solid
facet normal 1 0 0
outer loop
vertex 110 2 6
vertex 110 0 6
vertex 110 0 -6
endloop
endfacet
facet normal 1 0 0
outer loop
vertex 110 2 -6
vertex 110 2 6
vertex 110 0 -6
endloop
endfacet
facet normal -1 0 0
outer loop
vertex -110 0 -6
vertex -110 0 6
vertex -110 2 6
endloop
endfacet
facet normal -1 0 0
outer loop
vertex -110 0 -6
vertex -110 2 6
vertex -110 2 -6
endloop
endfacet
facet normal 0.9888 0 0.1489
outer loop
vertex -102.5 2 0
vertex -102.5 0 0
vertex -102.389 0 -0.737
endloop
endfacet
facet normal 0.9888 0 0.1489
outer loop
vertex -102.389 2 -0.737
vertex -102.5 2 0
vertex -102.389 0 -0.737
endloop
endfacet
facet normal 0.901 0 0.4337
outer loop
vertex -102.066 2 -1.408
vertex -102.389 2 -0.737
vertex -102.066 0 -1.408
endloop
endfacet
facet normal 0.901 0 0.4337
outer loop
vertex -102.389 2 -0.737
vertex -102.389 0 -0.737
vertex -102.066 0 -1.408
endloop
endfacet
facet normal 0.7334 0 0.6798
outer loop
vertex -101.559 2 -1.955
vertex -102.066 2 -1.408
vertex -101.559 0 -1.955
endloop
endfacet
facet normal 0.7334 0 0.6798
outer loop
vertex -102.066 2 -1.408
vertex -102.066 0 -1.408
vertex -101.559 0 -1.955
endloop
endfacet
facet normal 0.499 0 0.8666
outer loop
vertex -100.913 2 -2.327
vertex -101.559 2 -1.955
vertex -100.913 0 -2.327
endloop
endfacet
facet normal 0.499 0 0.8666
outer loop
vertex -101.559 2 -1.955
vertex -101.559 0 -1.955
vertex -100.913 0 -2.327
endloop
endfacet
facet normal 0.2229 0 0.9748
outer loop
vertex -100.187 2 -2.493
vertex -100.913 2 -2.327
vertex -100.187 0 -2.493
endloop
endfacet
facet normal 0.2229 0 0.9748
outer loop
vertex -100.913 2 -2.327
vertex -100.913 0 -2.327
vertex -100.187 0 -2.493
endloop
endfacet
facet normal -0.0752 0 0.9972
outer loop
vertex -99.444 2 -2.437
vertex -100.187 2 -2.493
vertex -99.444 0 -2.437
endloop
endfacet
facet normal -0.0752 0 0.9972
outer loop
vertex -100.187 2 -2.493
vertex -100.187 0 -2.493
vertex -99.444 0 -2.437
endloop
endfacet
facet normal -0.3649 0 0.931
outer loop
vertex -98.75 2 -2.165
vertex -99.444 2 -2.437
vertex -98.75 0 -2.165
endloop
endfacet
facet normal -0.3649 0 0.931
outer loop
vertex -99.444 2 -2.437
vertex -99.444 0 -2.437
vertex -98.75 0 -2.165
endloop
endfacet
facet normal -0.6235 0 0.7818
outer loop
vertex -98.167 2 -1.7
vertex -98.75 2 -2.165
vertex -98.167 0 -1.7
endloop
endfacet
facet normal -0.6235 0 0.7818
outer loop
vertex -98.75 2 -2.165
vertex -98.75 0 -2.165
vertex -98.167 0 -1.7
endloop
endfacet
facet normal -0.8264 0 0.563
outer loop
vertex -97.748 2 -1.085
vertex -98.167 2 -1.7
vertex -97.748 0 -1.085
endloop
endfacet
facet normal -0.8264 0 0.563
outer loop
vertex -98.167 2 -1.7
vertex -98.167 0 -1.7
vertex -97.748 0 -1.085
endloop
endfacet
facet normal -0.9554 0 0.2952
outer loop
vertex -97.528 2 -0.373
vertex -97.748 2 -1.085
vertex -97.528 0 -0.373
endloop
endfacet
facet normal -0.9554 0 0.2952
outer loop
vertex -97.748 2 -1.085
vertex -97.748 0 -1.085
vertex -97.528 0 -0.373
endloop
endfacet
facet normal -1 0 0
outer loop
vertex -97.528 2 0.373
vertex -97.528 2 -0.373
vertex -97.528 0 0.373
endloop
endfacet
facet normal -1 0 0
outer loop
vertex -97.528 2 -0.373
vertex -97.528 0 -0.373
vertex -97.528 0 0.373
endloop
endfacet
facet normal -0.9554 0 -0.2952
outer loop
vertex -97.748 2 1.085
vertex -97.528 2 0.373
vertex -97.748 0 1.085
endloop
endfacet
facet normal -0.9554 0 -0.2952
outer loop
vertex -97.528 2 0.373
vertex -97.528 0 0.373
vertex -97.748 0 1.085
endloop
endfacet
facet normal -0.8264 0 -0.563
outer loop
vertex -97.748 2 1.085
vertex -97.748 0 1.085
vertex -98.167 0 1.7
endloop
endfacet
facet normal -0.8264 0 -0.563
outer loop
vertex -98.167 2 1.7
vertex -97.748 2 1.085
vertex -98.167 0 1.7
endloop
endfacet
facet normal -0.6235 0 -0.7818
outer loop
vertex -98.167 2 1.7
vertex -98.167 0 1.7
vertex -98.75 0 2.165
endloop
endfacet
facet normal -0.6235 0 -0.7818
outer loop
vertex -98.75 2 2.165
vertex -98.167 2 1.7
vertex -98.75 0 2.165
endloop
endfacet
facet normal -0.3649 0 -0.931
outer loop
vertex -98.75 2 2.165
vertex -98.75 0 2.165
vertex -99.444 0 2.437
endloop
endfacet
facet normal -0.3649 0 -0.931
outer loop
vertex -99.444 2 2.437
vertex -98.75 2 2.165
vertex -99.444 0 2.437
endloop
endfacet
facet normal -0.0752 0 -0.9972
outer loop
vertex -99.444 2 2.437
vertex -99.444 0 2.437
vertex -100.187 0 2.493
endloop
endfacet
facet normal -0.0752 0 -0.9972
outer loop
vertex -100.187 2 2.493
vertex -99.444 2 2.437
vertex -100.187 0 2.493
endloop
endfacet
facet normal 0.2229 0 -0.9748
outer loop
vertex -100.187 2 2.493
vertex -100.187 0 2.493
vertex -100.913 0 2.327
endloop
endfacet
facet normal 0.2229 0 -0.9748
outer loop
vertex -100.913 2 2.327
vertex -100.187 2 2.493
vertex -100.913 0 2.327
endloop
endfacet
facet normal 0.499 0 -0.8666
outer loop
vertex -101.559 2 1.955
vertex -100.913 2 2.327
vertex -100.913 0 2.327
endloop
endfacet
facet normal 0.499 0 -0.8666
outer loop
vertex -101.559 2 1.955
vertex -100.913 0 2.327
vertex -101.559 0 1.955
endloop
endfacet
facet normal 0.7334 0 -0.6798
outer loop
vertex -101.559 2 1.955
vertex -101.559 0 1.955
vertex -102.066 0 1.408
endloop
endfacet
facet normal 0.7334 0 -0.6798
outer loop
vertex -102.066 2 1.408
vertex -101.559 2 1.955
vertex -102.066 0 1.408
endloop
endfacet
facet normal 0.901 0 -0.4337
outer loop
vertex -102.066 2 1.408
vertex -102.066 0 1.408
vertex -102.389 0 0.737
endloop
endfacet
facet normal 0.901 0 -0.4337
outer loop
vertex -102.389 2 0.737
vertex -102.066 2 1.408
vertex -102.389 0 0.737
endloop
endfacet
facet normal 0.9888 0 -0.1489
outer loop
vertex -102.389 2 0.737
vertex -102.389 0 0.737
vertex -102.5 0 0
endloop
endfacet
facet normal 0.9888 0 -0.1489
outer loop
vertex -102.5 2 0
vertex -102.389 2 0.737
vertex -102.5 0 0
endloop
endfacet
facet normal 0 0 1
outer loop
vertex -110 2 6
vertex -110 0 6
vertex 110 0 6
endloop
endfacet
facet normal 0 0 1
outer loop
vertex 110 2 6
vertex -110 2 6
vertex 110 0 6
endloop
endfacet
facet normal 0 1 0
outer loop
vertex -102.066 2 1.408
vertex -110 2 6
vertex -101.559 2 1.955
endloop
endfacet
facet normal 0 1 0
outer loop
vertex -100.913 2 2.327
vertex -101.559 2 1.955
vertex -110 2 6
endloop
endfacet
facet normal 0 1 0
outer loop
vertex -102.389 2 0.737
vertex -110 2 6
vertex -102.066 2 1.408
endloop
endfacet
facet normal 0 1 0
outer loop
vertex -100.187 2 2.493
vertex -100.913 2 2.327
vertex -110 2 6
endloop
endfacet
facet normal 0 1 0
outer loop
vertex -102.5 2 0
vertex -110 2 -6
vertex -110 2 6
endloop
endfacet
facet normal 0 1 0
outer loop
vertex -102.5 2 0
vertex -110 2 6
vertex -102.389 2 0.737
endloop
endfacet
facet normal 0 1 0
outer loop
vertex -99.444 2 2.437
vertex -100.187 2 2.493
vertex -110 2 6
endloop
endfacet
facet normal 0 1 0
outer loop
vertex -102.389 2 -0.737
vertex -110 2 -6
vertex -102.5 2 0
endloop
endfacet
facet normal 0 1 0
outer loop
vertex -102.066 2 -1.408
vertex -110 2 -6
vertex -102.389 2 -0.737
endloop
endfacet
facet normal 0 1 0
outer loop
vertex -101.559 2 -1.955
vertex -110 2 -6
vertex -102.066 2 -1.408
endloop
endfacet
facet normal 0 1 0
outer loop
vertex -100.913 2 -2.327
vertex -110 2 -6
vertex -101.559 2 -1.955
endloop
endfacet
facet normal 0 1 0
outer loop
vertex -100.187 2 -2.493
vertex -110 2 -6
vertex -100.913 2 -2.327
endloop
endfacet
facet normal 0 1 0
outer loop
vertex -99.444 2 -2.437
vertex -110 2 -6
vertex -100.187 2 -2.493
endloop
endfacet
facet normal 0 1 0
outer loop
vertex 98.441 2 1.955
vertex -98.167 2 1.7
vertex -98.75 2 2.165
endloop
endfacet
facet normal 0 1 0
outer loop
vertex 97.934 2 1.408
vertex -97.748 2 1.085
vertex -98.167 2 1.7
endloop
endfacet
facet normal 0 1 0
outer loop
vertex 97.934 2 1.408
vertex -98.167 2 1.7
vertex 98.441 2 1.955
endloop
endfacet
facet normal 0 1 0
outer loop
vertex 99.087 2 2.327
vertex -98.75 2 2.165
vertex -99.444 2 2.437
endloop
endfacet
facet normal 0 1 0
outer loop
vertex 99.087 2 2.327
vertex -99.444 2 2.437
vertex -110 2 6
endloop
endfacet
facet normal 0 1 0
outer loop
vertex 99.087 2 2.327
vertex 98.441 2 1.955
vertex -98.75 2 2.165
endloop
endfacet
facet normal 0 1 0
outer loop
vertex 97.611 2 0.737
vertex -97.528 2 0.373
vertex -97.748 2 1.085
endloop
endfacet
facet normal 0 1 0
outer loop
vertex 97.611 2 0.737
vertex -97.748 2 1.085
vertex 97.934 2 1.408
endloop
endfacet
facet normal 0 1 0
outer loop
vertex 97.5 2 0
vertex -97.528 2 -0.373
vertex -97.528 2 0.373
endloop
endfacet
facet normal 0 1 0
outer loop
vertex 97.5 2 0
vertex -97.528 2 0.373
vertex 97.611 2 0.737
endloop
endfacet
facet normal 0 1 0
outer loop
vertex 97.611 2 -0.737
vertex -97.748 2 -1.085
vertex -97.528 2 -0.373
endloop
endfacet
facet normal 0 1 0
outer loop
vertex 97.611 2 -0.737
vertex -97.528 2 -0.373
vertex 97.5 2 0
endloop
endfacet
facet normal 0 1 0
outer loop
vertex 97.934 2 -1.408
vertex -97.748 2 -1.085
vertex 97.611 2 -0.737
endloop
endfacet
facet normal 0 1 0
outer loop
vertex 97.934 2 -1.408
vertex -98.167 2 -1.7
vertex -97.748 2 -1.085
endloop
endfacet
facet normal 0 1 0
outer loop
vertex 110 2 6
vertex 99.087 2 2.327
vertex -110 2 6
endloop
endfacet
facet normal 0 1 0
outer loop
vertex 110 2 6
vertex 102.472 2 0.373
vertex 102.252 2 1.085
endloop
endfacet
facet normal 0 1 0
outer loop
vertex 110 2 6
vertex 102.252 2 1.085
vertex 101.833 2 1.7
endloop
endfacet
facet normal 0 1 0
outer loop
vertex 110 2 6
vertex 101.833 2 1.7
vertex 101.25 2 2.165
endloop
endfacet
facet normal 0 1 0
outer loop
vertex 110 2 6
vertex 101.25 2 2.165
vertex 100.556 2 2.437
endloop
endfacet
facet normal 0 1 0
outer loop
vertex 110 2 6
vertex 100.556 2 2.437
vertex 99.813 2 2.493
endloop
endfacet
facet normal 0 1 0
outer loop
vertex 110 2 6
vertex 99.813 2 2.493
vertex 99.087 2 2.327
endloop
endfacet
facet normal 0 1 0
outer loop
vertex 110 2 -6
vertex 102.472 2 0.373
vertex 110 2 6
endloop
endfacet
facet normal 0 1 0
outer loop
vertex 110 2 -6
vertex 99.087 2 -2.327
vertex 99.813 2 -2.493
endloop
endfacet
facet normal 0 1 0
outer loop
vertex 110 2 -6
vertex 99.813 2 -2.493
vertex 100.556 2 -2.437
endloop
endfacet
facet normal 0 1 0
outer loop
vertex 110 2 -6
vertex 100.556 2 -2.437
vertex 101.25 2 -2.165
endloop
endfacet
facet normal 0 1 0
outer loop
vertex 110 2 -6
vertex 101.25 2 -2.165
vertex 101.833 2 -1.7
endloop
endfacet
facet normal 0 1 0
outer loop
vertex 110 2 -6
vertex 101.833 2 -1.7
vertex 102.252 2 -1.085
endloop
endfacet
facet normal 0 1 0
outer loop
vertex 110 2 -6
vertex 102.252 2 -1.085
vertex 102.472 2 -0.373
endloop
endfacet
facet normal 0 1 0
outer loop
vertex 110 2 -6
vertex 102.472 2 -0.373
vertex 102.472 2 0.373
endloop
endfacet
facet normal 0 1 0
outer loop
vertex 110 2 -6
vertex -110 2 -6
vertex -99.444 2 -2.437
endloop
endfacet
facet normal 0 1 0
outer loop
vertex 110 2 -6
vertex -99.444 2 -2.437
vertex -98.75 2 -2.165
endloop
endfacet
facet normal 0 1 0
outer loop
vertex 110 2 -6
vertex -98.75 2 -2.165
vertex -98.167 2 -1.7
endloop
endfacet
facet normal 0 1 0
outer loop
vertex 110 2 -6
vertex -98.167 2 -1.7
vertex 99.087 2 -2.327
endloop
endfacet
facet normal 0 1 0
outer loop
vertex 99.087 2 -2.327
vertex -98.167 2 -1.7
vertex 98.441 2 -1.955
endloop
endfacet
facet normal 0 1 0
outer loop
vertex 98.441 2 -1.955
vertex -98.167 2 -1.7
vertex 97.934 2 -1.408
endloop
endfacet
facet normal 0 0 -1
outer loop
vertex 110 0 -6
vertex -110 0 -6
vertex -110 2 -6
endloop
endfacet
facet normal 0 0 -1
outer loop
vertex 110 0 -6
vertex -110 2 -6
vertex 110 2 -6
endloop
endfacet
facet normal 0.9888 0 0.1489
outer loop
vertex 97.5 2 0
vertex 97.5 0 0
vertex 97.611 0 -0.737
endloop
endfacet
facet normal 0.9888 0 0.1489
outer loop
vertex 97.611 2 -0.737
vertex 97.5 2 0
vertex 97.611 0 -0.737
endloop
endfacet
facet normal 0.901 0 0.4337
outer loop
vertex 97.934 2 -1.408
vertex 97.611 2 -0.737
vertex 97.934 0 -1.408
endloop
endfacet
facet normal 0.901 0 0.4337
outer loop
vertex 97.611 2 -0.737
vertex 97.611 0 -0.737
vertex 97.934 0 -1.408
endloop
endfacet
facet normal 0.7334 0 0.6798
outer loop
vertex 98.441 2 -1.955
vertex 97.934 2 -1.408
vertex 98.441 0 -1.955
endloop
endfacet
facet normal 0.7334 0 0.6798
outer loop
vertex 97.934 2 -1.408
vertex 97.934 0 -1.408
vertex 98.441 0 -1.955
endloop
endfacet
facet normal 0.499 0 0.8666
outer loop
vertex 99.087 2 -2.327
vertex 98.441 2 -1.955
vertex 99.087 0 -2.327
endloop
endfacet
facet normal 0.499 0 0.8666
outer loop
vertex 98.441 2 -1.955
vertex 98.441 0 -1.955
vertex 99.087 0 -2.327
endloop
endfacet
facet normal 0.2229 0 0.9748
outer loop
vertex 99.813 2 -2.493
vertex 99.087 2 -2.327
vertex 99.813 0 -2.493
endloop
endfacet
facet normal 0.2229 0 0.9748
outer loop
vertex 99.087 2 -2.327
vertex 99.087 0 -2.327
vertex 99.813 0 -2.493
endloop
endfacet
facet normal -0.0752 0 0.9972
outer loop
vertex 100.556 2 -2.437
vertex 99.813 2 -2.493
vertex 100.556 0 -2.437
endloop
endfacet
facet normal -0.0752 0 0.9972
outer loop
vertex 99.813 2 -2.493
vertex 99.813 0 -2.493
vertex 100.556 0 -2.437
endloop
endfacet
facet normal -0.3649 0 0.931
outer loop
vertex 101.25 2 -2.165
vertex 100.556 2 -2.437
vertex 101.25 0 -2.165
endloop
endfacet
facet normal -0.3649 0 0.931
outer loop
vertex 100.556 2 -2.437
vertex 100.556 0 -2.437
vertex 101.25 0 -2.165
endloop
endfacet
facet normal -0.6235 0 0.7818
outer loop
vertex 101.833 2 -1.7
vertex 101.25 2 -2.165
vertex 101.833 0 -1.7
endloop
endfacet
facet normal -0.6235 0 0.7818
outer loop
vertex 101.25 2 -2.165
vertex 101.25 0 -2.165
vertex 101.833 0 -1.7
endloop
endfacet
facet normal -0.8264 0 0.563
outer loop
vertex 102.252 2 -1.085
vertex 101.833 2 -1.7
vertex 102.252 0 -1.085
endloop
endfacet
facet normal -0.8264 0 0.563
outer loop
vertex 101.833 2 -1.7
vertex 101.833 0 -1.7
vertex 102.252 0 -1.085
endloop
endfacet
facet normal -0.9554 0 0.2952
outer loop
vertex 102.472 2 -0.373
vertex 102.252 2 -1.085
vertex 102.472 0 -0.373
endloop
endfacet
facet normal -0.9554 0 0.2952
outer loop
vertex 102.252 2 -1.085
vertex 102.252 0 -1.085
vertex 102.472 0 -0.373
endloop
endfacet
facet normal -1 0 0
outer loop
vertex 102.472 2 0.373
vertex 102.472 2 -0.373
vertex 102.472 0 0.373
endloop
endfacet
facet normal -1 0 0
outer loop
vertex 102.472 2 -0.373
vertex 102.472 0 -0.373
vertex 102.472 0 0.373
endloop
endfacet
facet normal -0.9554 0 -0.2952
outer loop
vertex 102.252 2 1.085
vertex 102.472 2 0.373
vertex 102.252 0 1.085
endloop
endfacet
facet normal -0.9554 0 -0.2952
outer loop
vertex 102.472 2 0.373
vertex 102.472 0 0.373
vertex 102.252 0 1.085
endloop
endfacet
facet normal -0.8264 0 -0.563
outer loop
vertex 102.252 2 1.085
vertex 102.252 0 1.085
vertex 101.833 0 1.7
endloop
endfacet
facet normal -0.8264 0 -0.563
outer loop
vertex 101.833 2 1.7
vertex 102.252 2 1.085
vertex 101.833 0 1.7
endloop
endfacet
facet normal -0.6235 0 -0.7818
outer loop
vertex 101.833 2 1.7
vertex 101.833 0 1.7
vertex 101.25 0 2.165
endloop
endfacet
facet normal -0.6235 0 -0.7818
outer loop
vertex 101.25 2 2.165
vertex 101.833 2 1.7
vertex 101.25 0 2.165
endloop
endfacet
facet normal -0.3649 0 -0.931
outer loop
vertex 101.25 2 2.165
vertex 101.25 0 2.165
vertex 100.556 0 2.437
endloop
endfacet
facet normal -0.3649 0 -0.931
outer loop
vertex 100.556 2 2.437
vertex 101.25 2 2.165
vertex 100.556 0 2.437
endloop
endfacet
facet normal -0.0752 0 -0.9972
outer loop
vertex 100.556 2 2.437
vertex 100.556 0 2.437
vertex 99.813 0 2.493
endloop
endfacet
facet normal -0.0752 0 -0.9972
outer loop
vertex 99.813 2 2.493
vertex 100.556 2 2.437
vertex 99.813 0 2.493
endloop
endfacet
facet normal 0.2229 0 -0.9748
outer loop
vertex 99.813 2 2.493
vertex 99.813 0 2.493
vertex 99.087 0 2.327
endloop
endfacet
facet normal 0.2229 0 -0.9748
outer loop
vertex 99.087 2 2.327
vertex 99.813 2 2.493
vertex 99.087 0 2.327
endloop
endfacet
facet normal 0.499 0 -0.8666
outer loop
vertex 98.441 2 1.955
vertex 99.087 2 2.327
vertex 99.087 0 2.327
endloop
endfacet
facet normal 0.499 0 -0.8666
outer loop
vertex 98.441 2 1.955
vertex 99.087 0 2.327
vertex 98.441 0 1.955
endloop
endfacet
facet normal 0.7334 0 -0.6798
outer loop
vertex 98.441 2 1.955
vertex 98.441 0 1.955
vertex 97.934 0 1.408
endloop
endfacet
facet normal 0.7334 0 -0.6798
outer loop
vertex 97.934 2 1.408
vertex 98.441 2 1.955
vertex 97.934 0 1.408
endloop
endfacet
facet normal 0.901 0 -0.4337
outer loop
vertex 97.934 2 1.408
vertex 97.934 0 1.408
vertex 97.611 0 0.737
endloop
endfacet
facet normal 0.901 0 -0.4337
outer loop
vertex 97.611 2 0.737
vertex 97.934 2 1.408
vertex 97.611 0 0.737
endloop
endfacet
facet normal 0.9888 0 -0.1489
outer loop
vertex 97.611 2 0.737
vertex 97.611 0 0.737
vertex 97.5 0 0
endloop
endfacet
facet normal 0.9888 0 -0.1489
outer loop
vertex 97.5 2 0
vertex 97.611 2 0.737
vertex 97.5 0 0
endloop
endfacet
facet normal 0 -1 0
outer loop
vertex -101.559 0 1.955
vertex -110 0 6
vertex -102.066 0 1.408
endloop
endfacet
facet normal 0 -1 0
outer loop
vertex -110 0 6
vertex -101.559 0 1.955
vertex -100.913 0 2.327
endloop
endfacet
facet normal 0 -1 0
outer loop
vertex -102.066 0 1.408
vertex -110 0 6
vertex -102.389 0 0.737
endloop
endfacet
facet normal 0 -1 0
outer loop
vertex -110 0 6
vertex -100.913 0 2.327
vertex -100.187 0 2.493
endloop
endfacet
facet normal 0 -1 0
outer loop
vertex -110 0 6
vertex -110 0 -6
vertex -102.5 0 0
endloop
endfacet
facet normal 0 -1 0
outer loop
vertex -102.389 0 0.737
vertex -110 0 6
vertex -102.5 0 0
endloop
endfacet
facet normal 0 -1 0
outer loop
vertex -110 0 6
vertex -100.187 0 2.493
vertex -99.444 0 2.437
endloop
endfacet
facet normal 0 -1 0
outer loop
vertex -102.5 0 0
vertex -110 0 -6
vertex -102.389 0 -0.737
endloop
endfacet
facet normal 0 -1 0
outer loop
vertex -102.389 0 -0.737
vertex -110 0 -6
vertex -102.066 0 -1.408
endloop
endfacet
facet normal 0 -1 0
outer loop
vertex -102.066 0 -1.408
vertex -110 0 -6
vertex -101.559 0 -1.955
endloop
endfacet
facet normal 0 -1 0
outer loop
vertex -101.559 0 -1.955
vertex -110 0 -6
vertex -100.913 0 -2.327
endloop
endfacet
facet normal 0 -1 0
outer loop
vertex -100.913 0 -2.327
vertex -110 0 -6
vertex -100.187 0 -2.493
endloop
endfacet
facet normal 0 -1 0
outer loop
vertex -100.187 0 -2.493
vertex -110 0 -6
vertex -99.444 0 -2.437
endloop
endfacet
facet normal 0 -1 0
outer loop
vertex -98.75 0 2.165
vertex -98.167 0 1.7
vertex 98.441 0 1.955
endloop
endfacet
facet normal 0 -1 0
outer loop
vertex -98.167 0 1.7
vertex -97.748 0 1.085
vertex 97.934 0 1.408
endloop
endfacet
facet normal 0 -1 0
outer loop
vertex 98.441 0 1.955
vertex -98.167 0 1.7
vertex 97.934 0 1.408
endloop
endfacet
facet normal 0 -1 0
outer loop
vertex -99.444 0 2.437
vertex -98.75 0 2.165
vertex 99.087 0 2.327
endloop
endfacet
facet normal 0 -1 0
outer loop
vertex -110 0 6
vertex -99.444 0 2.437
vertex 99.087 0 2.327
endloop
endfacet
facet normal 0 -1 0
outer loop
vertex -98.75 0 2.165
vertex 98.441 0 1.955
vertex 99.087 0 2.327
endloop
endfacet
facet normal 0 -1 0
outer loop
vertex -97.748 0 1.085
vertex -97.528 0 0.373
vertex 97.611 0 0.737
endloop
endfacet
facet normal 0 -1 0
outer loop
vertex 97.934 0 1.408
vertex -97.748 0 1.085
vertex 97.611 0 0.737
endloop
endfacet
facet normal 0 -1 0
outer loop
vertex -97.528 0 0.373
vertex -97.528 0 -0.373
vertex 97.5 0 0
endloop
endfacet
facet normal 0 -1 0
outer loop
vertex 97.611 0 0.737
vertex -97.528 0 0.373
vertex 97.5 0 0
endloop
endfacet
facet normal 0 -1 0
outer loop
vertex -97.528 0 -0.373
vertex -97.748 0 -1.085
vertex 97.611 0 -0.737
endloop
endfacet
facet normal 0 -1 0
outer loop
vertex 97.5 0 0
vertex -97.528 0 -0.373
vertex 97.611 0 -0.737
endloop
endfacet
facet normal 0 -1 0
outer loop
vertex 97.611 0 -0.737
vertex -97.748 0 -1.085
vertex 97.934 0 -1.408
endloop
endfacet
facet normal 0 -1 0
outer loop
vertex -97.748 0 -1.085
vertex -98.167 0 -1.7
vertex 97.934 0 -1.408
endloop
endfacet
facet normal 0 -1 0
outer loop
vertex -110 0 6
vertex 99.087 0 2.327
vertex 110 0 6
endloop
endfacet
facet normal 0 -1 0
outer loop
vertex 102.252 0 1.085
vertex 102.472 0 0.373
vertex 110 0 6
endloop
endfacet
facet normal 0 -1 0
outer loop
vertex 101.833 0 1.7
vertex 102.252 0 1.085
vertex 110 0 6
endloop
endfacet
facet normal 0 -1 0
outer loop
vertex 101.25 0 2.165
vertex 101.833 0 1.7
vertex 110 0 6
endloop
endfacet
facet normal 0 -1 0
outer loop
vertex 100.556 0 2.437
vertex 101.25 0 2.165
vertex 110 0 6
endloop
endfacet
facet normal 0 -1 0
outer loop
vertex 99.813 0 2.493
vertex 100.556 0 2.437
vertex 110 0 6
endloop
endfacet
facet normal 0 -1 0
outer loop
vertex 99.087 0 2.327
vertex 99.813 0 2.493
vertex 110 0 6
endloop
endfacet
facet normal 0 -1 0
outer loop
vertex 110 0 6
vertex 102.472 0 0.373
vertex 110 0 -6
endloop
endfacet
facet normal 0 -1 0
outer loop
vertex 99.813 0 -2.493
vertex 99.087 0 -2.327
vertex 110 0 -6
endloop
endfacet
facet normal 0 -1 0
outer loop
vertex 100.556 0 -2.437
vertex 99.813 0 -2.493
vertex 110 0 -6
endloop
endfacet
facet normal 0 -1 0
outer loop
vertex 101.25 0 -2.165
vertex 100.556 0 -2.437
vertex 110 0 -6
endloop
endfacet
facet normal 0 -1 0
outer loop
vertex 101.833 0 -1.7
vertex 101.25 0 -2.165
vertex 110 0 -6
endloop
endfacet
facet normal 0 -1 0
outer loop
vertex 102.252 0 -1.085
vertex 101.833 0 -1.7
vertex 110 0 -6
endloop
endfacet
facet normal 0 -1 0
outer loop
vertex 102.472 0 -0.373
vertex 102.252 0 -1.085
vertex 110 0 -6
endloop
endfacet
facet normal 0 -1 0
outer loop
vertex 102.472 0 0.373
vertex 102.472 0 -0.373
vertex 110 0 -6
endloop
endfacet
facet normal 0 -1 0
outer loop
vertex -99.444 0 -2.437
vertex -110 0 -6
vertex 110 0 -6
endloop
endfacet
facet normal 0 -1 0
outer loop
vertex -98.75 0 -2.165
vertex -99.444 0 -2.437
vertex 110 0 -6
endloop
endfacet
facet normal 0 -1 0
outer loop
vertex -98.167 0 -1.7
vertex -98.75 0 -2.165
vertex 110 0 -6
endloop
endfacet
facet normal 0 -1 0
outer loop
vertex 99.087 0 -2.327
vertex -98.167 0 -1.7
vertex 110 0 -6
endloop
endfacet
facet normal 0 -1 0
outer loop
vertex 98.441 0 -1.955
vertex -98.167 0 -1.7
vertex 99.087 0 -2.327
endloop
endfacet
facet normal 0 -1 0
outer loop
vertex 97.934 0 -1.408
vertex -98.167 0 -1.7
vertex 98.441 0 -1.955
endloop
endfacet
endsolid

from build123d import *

# Parameters (mm, degrees)
SKETCH1_W                 = 220
SKETCH1_H                 = 12
BOSS_EXTRUDE1_DEPTH       = 2
F_5_0MM_DOWEL_HOLE1_D     = 5
F_5_0MM_DOWEL_HOLE1_DEPTH = 2


with BuildPart() as part:
    # Sketch1 → Boss-Extrude1 (new body)
    with BuildSketch(Plane(origin=(0, 0, 0), x_dir=(1, 0, 0), z_dir=(0, 1, 0))):
        Rectangle(SKETCH1_W, SKETCH1_H)
    extrude(amount=BOSS_EXTRUDE1_DEPTH)

    # Ø5.0mm Dowel Hole1
    with Locations(Plane(origin=(0, 2, 0), x_dir=(1, 0, 0), z_dir=(0, 1, 0))):
        with Locations((-100, 0), (100, 0)):
            Hole(F_5_0MM_DOWEL_HOLE1_D / 2, depth=F_5_0MM_DOWEL_HOLE1_DEPTH)


solid = part.part
